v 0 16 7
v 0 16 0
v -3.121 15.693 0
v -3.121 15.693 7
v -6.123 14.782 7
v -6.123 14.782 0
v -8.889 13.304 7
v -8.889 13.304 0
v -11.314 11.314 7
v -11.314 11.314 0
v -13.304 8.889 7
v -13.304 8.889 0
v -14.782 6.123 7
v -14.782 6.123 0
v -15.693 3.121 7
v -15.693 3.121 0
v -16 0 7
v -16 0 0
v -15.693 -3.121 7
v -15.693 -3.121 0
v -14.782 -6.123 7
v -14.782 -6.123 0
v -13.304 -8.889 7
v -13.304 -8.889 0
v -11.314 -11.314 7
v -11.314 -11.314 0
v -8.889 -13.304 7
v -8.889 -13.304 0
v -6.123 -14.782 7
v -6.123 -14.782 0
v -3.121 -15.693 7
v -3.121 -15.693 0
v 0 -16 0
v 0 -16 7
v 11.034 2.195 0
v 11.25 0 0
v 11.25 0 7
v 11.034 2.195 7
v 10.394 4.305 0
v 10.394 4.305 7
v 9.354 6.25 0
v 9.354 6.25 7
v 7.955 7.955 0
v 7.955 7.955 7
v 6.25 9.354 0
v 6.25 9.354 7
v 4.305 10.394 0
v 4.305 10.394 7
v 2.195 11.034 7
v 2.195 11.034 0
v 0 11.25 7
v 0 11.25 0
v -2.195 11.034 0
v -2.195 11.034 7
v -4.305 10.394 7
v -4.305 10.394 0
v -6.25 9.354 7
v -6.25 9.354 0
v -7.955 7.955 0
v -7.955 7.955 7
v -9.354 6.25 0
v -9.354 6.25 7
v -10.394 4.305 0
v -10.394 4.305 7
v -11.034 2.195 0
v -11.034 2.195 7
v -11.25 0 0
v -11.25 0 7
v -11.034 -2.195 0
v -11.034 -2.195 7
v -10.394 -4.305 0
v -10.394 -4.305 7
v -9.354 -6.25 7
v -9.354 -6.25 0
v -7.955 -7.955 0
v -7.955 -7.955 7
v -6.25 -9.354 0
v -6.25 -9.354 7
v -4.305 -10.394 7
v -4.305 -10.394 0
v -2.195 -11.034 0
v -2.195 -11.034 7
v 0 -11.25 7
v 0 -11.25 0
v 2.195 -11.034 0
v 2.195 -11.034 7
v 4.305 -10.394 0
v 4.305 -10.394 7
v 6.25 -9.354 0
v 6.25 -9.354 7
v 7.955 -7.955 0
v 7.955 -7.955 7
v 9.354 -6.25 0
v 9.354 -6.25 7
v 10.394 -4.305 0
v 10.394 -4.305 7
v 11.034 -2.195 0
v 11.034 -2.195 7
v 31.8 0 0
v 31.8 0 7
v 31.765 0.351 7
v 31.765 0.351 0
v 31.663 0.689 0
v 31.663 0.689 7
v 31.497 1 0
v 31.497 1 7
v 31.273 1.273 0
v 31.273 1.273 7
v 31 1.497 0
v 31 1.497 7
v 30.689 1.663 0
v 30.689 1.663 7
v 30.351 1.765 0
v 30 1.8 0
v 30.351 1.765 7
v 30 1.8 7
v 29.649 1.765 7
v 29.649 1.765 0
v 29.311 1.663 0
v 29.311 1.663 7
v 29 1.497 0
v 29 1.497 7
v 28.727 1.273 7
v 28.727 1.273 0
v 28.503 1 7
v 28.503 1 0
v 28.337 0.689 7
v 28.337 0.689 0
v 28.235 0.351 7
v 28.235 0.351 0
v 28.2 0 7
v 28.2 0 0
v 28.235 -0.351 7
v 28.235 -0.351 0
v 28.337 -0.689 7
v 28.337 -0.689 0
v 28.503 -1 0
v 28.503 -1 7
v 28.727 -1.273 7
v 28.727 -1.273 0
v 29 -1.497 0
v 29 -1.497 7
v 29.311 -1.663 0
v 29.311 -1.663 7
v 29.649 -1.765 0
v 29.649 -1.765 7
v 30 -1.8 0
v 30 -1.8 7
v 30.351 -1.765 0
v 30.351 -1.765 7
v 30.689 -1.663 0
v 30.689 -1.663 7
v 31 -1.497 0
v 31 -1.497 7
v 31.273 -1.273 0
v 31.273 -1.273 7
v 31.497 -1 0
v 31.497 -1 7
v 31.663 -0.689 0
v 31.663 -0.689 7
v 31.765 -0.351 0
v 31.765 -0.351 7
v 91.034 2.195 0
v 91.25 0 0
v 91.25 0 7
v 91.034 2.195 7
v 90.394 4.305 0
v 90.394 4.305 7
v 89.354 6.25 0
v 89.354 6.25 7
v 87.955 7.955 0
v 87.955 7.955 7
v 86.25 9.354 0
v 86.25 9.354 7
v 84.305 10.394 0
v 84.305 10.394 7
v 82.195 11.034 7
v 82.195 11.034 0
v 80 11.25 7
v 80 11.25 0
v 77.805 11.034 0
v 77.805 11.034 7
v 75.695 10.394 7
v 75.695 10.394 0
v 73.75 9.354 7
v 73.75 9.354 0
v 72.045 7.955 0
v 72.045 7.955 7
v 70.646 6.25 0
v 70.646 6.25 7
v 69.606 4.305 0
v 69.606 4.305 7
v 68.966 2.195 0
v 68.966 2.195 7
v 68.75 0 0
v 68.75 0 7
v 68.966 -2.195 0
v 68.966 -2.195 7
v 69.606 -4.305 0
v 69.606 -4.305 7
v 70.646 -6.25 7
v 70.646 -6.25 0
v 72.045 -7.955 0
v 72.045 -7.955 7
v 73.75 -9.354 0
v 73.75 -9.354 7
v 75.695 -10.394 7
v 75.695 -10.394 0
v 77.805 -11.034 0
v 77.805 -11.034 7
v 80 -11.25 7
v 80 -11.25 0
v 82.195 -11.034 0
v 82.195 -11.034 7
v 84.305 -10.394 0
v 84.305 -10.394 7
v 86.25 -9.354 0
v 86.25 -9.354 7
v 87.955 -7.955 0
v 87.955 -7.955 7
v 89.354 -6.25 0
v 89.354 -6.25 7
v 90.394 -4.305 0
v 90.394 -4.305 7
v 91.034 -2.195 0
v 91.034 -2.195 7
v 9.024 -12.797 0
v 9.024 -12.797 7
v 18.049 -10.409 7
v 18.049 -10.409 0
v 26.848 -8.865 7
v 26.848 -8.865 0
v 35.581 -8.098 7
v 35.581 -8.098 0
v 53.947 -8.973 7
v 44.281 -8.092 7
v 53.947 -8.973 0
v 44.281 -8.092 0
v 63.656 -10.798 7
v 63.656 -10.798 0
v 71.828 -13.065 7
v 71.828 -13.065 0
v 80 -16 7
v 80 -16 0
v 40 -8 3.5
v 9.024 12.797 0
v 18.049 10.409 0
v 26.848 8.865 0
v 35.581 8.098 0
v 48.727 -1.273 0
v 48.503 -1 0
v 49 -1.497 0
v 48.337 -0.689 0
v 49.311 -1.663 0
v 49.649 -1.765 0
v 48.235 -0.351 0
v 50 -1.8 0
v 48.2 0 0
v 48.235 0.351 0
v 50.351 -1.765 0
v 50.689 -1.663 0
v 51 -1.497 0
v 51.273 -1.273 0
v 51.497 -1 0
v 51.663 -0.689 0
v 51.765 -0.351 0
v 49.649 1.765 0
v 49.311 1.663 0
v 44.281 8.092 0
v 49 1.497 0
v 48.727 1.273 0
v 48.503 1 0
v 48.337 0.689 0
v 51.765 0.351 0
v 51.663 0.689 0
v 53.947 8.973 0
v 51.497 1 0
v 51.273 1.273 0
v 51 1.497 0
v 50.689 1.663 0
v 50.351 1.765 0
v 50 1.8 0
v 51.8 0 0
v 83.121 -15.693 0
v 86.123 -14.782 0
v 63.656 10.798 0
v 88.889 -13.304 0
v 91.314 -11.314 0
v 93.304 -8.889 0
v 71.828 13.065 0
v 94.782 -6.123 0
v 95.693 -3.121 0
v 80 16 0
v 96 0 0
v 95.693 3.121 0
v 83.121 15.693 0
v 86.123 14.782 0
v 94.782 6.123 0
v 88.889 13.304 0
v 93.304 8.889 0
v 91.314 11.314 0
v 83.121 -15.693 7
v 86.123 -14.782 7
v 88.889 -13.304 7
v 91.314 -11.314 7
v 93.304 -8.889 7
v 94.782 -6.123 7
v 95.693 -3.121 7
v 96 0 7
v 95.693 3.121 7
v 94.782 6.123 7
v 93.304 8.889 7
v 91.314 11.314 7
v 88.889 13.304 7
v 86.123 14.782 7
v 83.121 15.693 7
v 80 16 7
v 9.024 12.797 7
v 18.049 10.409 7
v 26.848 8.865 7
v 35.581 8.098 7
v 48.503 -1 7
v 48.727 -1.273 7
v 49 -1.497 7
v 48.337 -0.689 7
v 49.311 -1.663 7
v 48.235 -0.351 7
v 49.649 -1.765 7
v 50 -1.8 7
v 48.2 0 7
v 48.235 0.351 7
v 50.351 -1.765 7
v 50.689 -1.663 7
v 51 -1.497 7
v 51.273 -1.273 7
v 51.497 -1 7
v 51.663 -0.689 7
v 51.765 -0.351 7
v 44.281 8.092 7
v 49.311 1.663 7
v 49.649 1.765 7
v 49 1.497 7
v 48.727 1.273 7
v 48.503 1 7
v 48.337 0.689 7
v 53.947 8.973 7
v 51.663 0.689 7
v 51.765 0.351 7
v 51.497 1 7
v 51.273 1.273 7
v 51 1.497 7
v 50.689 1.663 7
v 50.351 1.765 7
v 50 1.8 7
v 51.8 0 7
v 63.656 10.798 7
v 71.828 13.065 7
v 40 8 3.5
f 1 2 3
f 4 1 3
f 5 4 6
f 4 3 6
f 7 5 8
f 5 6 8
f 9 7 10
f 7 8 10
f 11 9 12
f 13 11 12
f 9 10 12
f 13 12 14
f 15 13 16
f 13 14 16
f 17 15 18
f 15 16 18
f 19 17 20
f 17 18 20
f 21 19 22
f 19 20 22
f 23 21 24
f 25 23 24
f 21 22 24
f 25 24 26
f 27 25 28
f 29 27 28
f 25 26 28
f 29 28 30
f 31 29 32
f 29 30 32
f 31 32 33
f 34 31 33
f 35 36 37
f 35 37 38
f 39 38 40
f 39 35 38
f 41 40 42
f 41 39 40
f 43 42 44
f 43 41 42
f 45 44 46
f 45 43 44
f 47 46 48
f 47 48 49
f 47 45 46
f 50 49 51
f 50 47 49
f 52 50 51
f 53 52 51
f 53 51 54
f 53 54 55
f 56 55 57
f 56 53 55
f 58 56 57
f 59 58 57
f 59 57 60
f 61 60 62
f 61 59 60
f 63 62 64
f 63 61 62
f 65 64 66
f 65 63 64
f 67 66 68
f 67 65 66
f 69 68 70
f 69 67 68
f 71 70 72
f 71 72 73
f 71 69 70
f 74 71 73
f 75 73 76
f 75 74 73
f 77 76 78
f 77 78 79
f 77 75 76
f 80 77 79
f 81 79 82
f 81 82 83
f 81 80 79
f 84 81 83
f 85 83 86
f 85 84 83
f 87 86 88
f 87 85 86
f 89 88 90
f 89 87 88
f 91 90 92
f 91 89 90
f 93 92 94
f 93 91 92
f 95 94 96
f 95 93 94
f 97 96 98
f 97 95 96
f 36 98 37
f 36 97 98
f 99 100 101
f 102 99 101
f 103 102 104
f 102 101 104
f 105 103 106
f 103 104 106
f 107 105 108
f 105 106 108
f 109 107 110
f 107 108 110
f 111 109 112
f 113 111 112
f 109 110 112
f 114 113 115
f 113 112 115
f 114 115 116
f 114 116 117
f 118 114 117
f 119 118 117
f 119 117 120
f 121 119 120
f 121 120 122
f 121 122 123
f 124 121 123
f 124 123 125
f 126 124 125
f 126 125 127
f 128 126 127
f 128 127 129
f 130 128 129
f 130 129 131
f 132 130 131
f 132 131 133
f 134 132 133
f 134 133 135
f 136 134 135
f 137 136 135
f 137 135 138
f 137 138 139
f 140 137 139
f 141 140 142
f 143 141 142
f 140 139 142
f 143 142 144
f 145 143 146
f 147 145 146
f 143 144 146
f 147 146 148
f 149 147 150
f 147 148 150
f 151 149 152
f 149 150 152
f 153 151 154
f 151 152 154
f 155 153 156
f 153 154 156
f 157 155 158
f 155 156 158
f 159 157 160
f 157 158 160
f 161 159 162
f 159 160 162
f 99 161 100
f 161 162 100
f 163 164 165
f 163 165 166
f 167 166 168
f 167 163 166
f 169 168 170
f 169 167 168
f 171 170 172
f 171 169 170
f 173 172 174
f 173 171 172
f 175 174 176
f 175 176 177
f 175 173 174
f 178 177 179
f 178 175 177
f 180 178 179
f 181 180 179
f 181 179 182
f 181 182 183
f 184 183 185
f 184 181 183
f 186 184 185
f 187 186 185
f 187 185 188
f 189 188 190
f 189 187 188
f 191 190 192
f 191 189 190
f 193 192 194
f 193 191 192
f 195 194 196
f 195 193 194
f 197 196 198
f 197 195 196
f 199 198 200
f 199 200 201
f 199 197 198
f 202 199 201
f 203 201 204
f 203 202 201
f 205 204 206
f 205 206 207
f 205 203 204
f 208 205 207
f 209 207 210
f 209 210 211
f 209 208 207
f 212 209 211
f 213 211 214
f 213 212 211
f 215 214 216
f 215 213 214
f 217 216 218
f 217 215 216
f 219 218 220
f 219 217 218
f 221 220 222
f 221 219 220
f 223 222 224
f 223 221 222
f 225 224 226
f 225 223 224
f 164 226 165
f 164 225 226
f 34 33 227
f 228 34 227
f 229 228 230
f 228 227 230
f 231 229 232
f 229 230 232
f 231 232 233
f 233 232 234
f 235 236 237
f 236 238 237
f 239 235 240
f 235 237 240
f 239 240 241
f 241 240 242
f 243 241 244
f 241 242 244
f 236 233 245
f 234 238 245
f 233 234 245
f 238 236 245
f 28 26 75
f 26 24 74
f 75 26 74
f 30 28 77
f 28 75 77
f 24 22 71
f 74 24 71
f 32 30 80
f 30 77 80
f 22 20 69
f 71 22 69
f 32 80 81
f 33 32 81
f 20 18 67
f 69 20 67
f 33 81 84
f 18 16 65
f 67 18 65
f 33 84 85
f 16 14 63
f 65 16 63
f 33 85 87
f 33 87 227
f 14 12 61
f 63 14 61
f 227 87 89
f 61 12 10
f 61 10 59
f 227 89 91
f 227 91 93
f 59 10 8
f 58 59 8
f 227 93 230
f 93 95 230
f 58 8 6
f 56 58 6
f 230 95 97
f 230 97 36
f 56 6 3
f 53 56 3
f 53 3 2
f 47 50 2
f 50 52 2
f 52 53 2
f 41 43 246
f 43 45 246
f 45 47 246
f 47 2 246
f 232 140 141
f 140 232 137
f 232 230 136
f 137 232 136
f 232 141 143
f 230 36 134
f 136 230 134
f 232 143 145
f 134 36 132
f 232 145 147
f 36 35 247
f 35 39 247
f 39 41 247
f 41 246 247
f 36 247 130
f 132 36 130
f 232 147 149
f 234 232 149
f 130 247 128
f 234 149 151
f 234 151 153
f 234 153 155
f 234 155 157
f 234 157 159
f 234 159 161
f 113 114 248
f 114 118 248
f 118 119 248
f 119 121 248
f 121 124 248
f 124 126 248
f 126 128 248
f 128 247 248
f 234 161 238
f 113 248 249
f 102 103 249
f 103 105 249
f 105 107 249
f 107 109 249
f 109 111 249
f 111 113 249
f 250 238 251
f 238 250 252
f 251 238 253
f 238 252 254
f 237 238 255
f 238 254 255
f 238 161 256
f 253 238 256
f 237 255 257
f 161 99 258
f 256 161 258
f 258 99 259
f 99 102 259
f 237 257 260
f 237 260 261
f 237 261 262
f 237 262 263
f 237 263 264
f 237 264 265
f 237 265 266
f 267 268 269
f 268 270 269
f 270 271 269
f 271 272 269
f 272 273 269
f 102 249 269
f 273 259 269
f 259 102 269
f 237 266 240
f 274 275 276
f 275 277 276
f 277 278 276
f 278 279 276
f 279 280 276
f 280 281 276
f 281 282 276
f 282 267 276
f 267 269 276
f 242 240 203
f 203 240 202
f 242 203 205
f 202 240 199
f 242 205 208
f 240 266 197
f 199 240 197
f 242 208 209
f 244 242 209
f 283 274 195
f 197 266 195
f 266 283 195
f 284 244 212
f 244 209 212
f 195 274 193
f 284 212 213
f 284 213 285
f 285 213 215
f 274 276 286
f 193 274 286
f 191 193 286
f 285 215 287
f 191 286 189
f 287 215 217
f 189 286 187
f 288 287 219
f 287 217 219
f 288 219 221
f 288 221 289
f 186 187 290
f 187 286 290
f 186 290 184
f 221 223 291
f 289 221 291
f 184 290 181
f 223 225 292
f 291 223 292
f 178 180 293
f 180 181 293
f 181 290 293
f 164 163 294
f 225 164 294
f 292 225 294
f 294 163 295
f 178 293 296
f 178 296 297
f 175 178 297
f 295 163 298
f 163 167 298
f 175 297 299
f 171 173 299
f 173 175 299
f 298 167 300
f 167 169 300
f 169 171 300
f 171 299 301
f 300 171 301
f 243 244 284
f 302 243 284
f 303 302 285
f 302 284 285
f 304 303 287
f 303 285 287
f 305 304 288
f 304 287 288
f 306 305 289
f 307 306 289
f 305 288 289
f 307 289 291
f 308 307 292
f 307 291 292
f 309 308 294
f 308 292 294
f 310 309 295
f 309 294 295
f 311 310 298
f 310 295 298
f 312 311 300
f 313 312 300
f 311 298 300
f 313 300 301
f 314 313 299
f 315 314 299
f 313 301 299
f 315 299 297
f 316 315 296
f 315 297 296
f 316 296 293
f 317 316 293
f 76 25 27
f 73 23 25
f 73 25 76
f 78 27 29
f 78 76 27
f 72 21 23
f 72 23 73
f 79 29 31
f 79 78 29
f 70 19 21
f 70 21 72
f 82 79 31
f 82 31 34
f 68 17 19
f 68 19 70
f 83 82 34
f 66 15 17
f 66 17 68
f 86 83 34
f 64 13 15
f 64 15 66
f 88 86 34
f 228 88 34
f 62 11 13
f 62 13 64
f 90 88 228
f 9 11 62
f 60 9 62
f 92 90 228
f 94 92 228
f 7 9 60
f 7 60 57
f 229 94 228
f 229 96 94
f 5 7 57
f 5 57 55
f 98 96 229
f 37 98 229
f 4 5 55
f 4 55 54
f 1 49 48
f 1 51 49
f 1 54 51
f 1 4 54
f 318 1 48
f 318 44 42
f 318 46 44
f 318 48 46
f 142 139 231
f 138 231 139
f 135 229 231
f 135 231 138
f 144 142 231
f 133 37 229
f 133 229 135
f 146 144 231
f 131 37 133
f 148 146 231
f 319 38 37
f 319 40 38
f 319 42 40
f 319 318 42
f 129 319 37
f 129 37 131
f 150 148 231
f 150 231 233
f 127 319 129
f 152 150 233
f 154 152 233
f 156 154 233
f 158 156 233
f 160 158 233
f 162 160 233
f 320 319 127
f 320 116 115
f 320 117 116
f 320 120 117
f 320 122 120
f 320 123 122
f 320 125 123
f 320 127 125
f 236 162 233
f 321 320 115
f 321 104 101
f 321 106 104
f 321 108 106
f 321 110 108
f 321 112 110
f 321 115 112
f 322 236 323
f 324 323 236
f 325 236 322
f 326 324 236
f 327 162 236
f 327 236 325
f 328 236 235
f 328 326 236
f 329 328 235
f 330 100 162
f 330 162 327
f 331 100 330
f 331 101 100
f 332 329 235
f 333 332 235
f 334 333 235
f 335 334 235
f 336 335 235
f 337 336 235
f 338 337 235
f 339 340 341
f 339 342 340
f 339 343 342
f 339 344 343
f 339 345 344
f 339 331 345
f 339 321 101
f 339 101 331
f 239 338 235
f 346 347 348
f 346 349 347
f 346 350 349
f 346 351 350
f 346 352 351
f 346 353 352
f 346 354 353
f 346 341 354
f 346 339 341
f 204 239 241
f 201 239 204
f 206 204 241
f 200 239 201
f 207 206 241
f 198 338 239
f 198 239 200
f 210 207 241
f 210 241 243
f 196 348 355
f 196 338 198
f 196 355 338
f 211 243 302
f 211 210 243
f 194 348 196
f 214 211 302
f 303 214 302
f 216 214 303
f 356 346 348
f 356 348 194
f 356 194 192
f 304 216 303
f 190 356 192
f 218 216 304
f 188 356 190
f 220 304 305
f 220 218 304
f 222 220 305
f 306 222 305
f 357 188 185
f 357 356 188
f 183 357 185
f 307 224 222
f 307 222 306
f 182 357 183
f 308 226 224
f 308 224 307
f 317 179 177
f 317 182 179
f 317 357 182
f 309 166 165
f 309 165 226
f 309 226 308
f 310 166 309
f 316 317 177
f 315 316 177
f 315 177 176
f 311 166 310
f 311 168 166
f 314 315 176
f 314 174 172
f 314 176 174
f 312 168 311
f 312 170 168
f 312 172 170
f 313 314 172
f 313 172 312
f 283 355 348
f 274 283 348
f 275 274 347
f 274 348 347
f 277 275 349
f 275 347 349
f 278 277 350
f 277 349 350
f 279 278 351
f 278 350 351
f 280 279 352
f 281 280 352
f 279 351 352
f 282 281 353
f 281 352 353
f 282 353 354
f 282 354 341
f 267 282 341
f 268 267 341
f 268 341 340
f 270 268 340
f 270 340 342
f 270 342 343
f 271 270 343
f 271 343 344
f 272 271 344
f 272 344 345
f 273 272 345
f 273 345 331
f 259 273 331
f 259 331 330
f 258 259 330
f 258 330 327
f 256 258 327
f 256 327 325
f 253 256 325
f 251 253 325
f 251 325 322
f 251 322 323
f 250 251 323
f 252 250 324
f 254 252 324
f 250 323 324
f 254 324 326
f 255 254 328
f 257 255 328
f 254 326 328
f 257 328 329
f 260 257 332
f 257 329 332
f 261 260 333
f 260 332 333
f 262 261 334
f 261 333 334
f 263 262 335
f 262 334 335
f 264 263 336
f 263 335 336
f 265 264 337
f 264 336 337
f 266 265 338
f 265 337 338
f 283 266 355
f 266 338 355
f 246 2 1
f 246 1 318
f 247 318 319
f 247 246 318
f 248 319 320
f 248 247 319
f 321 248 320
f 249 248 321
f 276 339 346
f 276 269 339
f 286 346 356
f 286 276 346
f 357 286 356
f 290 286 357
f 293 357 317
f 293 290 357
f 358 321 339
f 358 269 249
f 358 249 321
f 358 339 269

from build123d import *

# Parameters (mm, degrees)
ESQUISSE1_R             = 11.25
BOSS_EXTRU_1_DEPTH      = 7
ESQUISSE2_R             = 1.8
ENL_V_MAT_EXTRU_1_DEPTH = 10


with BuildPart() as part:
    # Esquisse1 → Boss.-Extru.1 (new body)
    with BuildSketch(Plane.XY):
        with BuildLine():
            ThreePointArc((0, 16), (-16, 0), (0, -16))
            add(Edge.make_bspline(
                [(0, -16), (40, 0), (80, -16)],
                knots=[0, 0, 0, 1, 1, 1], degree=2))
            ThreePointArc((80, -16), (96, 0), (80, 16))
            add(Edge.make_bspline(
                [(0, 16), (40, 0), (80, 16)],
                knots=[0, 0, 0, 1, 1, 1], degree=2))
        make_face()
        with Locations((80, 0)):
            Circle(ESQUISSE1_R, mode=Mode.SUBTRACT)
        Circle(ESQUISSE1_R, mode=Mode.SUBTRACT)
    extrude(amount=BOSS_EXTRU_1_DEPTH)

    # Esquisse2 → Enlèv. mat.-Extru.1 (cut)
    with BuildSketch(Plane.XY.offset(7)):
        with Locations((30, 0)):
            Circle(ESQUISSE2_R)
        with Locations((50, 0)):
            Circle(ESQUISSE2_R)
    extrude(amount=-ENL_V_MAT_EXTRU_1_DEPTH, mode=Mode.SUBTRACT)


solid = part.part
